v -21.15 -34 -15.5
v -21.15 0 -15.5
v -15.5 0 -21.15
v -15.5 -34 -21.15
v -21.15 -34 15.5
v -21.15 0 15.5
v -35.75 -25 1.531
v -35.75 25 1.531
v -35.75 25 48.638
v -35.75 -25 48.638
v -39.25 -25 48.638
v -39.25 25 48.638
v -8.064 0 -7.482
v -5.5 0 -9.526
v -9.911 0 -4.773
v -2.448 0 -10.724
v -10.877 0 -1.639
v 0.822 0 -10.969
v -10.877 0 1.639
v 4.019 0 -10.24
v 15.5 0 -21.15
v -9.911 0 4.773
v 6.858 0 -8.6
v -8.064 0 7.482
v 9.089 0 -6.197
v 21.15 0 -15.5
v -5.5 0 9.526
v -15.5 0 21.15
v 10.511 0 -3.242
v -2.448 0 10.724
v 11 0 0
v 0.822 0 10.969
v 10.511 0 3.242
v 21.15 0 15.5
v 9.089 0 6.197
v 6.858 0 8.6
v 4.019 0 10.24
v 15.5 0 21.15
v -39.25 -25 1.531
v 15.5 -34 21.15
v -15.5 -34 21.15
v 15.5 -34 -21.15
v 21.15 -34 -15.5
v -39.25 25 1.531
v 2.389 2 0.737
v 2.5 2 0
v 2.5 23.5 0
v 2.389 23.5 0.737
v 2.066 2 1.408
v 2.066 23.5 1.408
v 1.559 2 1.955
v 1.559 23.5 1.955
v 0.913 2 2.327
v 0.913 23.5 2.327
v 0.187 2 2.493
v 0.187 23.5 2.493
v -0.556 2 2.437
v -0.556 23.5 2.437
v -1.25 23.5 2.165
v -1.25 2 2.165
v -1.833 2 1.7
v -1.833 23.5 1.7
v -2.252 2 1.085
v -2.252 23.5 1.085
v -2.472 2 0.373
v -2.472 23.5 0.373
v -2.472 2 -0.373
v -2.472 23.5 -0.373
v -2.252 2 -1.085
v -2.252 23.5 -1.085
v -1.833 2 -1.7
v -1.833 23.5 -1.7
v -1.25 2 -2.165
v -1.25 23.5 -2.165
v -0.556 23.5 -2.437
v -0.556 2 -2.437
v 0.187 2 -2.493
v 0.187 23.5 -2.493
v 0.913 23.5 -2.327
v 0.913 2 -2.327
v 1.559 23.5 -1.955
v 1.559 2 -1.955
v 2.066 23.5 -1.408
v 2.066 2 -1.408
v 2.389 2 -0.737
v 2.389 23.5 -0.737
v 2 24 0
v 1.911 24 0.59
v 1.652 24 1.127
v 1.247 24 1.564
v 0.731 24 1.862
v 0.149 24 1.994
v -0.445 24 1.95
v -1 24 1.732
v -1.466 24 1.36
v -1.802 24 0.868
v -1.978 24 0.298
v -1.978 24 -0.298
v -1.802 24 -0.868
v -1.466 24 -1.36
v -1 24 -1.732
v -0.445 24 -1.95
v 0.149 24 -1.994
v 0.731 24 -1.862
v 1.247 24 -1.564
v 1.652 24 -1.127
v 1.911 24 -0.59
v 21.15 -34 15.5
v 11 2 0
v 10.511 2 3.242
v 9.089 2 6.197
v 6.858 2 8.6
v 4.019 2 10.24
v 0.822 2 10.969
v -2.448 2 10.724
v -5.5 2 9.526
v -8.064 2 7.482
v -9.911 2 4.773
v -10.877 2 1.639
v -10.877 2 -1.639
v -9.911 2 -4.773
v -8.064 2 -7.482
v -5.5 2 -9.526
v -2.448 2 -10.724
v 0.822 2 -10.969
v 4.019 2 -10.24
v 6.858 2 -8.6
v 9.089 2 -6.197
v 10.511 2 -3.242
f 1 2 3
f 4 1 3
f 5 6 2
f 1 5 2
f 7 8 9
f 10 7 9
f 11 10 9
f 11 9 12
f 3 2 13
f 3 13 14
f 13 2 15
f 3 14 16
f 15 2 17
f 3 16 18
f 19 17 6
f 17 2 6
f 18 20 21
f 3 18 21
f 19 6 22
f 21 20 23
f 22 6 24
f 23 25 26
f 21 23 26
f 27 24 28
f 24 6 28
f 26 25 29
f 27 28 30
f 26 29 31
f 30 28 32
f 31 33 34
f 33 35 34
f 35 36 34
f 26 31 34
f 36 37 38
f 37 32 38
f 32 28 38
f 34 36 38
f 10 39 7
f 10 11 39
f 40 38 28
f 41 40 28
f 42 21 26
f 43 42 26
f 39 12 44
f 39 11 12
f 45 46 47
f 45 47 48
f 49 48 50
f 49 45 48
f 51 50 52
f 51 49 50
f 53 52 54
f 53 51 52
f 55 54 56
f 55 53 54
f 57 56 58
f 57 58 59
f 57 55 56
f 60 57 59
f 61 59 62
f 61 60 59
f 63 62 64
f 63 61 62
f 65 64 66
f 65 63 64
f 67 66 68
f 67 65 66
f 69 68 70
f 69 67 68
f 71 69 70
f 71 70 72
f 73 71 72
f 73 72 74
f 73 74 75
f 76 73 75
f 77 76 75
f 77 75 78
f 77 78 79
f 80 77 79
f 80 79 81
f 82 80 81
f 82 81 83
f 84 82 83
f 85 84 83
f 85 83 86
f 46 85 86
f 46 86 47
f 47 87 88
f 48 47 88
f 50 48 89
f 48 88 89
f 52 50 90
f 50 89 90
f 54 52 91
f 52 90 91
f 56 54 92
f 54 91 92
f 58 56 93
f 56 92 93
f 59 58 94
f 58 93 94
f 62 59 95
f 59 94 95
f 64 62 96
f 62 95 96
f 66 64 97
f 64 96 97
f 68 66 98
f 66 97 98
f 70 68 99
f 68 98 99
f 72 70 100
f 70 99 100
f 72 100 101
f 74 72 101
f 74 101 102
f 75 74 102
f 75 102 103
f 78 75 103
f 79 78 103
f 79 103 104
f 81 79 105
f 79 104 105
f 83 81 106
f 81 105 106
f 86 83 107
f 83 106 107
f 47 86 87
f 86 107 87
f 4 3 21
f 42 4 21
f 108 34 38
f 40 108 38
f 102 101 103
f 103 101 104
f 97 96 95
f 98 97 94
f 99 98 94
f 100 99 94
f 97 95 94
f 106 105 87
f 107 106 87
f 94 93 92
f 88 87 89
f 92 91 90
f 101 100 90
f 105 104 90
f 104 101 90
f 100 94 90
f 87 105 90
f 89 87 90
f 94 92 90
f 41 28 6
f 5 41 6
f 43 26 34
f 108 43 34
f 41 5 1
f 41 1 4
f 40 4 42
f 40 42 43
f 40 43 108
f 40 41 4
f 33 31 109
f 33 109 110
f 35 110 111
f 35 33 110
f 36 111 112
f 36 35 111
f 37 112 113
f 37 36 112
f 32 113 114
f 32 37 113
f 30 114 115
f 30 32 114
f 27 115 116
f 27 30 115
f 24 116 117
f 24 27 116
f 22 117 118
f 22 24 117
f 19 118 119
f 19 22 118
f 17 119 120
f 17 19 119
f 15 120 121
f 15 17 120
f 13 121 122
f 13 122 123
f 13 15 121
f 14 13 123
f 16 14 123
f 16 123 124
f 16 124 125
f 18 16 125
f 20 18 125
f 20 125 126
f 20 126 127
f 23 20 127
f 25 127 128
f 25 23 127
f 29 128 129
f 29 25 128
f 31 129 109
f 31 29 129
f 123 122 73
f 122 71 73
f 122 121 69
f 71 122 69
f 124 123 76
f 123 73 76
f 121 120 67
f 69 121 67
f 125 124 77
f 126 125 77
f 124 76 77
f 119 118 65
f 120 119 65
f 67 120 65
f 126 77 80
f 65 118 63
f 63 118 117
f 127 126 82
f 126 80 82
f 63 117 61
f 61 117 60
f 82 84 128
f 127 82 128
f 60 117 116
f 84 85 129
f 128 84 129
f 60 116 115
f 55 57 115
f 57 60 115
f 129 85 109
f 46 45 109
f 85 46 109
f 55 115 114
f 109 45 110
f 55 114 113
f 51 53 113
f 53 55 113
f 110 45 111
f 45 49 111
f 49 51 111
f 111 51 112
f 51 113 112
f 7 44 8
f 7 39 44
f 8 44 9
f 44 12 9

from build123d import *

# Parameters (mm, degrees)
F3_DEPTH  = 34
F4_R      = 2.5
F7_DEPTH  = 24
F8_R      = 11
F9_DEPTH  = 2
F10_SIZE  = 0.5
F15_DEPTH = 25


with BuildPart() as f3:
    # F0 (on Front) → F3 (new body, through all)
    with BuildSketch(Plane.XZ):
        Polygon((21.15, 15.5), (15.5, 21.15), (-15.5, 21.15), (-21.15, 15.5), (-21.15, -15.5), (-15.5, -21.15), (15.5, -21.15), (21.15, -15.5), align=None)
    extrude(amount=F3_DEPTH)

    # F4 (on Front) → F7 (join, through all)
    with BuildSketch(Plane.XZ):
        Circle(F4_R)
    extrude(amount=-F7_DEPTH)

    # F8 (on Front) → F9 (join)
    with BuildSketch(Plane.XZ):
        Circle(F8_R)
    extrude(amount=-F9_DEPTH)

    # F10
    f10_edges = [f3.edges().sort_by_distance(p)[0] for p in [
        (-2.5, 24, 0),
    ]]
    chamfer(f10_edges, length=F10_SIZE)


with BuildPart() as f15:
    # F14 (on Front) → F15 (new body, symmetric)
    with BuildSketch(Plane.XZ):
        with BuildLine():
            Line((-39.25, 3.2808248822), (-39.25, 1.5308248822))
            Line((-39.25, 1.5308248822), (-37.5, 1.5308248822))
            ThreePointArc((-37.5, 1.5308248822), (-38.7374368671, 2.0433880151), (-39.25, 3.2808248822))
        make_face()
        with BuildLine():
            ThreePointArc((-35.75, 3.2808248822), (-36.2625631329, 2.0433880151), (-37.5, 1.5308248822))
            Line((-37.5, 1.5308248822), (-35.75, 1.5308248822))
            Line((-35.75, 1.5308248822), (-35.75, 3.2808248822))
        make_face()
        with BuildLine():
            ThreePointArc((-39.25, 3.2808248822), (-38.7374368671, 2.0433880151), (-37.5, 1.5308248822))
            ThreePointArc((-37.5, 1.5308248822), (-36.2625631329, 2.0433880151), (-35.75, 3.2808248822))
            ThreePointArc((-35.75, 3.2808248822), (-37.5, 5.0308248822), (-39.25, 3.2808248822))
        make_face()
        with BuildLine():
            Line((-39.25, 48.6383336474), (-39.25, 3.2808248822))
            ThreePointArc((-39.25, 3.2808248822), (-37.5, 5.0308248822), (-35.75, 3.2808248822))
            Line((-35.75, 3.2808248822), (-35.75, 48.6383336474))
            Line((-35.75, 48.6383336474), (-39.25, 48.6383336474))
        make_face()
    extrude(amount=F15_DEPTH, both=True)


solid = Compound([f3.part, f15.part])
